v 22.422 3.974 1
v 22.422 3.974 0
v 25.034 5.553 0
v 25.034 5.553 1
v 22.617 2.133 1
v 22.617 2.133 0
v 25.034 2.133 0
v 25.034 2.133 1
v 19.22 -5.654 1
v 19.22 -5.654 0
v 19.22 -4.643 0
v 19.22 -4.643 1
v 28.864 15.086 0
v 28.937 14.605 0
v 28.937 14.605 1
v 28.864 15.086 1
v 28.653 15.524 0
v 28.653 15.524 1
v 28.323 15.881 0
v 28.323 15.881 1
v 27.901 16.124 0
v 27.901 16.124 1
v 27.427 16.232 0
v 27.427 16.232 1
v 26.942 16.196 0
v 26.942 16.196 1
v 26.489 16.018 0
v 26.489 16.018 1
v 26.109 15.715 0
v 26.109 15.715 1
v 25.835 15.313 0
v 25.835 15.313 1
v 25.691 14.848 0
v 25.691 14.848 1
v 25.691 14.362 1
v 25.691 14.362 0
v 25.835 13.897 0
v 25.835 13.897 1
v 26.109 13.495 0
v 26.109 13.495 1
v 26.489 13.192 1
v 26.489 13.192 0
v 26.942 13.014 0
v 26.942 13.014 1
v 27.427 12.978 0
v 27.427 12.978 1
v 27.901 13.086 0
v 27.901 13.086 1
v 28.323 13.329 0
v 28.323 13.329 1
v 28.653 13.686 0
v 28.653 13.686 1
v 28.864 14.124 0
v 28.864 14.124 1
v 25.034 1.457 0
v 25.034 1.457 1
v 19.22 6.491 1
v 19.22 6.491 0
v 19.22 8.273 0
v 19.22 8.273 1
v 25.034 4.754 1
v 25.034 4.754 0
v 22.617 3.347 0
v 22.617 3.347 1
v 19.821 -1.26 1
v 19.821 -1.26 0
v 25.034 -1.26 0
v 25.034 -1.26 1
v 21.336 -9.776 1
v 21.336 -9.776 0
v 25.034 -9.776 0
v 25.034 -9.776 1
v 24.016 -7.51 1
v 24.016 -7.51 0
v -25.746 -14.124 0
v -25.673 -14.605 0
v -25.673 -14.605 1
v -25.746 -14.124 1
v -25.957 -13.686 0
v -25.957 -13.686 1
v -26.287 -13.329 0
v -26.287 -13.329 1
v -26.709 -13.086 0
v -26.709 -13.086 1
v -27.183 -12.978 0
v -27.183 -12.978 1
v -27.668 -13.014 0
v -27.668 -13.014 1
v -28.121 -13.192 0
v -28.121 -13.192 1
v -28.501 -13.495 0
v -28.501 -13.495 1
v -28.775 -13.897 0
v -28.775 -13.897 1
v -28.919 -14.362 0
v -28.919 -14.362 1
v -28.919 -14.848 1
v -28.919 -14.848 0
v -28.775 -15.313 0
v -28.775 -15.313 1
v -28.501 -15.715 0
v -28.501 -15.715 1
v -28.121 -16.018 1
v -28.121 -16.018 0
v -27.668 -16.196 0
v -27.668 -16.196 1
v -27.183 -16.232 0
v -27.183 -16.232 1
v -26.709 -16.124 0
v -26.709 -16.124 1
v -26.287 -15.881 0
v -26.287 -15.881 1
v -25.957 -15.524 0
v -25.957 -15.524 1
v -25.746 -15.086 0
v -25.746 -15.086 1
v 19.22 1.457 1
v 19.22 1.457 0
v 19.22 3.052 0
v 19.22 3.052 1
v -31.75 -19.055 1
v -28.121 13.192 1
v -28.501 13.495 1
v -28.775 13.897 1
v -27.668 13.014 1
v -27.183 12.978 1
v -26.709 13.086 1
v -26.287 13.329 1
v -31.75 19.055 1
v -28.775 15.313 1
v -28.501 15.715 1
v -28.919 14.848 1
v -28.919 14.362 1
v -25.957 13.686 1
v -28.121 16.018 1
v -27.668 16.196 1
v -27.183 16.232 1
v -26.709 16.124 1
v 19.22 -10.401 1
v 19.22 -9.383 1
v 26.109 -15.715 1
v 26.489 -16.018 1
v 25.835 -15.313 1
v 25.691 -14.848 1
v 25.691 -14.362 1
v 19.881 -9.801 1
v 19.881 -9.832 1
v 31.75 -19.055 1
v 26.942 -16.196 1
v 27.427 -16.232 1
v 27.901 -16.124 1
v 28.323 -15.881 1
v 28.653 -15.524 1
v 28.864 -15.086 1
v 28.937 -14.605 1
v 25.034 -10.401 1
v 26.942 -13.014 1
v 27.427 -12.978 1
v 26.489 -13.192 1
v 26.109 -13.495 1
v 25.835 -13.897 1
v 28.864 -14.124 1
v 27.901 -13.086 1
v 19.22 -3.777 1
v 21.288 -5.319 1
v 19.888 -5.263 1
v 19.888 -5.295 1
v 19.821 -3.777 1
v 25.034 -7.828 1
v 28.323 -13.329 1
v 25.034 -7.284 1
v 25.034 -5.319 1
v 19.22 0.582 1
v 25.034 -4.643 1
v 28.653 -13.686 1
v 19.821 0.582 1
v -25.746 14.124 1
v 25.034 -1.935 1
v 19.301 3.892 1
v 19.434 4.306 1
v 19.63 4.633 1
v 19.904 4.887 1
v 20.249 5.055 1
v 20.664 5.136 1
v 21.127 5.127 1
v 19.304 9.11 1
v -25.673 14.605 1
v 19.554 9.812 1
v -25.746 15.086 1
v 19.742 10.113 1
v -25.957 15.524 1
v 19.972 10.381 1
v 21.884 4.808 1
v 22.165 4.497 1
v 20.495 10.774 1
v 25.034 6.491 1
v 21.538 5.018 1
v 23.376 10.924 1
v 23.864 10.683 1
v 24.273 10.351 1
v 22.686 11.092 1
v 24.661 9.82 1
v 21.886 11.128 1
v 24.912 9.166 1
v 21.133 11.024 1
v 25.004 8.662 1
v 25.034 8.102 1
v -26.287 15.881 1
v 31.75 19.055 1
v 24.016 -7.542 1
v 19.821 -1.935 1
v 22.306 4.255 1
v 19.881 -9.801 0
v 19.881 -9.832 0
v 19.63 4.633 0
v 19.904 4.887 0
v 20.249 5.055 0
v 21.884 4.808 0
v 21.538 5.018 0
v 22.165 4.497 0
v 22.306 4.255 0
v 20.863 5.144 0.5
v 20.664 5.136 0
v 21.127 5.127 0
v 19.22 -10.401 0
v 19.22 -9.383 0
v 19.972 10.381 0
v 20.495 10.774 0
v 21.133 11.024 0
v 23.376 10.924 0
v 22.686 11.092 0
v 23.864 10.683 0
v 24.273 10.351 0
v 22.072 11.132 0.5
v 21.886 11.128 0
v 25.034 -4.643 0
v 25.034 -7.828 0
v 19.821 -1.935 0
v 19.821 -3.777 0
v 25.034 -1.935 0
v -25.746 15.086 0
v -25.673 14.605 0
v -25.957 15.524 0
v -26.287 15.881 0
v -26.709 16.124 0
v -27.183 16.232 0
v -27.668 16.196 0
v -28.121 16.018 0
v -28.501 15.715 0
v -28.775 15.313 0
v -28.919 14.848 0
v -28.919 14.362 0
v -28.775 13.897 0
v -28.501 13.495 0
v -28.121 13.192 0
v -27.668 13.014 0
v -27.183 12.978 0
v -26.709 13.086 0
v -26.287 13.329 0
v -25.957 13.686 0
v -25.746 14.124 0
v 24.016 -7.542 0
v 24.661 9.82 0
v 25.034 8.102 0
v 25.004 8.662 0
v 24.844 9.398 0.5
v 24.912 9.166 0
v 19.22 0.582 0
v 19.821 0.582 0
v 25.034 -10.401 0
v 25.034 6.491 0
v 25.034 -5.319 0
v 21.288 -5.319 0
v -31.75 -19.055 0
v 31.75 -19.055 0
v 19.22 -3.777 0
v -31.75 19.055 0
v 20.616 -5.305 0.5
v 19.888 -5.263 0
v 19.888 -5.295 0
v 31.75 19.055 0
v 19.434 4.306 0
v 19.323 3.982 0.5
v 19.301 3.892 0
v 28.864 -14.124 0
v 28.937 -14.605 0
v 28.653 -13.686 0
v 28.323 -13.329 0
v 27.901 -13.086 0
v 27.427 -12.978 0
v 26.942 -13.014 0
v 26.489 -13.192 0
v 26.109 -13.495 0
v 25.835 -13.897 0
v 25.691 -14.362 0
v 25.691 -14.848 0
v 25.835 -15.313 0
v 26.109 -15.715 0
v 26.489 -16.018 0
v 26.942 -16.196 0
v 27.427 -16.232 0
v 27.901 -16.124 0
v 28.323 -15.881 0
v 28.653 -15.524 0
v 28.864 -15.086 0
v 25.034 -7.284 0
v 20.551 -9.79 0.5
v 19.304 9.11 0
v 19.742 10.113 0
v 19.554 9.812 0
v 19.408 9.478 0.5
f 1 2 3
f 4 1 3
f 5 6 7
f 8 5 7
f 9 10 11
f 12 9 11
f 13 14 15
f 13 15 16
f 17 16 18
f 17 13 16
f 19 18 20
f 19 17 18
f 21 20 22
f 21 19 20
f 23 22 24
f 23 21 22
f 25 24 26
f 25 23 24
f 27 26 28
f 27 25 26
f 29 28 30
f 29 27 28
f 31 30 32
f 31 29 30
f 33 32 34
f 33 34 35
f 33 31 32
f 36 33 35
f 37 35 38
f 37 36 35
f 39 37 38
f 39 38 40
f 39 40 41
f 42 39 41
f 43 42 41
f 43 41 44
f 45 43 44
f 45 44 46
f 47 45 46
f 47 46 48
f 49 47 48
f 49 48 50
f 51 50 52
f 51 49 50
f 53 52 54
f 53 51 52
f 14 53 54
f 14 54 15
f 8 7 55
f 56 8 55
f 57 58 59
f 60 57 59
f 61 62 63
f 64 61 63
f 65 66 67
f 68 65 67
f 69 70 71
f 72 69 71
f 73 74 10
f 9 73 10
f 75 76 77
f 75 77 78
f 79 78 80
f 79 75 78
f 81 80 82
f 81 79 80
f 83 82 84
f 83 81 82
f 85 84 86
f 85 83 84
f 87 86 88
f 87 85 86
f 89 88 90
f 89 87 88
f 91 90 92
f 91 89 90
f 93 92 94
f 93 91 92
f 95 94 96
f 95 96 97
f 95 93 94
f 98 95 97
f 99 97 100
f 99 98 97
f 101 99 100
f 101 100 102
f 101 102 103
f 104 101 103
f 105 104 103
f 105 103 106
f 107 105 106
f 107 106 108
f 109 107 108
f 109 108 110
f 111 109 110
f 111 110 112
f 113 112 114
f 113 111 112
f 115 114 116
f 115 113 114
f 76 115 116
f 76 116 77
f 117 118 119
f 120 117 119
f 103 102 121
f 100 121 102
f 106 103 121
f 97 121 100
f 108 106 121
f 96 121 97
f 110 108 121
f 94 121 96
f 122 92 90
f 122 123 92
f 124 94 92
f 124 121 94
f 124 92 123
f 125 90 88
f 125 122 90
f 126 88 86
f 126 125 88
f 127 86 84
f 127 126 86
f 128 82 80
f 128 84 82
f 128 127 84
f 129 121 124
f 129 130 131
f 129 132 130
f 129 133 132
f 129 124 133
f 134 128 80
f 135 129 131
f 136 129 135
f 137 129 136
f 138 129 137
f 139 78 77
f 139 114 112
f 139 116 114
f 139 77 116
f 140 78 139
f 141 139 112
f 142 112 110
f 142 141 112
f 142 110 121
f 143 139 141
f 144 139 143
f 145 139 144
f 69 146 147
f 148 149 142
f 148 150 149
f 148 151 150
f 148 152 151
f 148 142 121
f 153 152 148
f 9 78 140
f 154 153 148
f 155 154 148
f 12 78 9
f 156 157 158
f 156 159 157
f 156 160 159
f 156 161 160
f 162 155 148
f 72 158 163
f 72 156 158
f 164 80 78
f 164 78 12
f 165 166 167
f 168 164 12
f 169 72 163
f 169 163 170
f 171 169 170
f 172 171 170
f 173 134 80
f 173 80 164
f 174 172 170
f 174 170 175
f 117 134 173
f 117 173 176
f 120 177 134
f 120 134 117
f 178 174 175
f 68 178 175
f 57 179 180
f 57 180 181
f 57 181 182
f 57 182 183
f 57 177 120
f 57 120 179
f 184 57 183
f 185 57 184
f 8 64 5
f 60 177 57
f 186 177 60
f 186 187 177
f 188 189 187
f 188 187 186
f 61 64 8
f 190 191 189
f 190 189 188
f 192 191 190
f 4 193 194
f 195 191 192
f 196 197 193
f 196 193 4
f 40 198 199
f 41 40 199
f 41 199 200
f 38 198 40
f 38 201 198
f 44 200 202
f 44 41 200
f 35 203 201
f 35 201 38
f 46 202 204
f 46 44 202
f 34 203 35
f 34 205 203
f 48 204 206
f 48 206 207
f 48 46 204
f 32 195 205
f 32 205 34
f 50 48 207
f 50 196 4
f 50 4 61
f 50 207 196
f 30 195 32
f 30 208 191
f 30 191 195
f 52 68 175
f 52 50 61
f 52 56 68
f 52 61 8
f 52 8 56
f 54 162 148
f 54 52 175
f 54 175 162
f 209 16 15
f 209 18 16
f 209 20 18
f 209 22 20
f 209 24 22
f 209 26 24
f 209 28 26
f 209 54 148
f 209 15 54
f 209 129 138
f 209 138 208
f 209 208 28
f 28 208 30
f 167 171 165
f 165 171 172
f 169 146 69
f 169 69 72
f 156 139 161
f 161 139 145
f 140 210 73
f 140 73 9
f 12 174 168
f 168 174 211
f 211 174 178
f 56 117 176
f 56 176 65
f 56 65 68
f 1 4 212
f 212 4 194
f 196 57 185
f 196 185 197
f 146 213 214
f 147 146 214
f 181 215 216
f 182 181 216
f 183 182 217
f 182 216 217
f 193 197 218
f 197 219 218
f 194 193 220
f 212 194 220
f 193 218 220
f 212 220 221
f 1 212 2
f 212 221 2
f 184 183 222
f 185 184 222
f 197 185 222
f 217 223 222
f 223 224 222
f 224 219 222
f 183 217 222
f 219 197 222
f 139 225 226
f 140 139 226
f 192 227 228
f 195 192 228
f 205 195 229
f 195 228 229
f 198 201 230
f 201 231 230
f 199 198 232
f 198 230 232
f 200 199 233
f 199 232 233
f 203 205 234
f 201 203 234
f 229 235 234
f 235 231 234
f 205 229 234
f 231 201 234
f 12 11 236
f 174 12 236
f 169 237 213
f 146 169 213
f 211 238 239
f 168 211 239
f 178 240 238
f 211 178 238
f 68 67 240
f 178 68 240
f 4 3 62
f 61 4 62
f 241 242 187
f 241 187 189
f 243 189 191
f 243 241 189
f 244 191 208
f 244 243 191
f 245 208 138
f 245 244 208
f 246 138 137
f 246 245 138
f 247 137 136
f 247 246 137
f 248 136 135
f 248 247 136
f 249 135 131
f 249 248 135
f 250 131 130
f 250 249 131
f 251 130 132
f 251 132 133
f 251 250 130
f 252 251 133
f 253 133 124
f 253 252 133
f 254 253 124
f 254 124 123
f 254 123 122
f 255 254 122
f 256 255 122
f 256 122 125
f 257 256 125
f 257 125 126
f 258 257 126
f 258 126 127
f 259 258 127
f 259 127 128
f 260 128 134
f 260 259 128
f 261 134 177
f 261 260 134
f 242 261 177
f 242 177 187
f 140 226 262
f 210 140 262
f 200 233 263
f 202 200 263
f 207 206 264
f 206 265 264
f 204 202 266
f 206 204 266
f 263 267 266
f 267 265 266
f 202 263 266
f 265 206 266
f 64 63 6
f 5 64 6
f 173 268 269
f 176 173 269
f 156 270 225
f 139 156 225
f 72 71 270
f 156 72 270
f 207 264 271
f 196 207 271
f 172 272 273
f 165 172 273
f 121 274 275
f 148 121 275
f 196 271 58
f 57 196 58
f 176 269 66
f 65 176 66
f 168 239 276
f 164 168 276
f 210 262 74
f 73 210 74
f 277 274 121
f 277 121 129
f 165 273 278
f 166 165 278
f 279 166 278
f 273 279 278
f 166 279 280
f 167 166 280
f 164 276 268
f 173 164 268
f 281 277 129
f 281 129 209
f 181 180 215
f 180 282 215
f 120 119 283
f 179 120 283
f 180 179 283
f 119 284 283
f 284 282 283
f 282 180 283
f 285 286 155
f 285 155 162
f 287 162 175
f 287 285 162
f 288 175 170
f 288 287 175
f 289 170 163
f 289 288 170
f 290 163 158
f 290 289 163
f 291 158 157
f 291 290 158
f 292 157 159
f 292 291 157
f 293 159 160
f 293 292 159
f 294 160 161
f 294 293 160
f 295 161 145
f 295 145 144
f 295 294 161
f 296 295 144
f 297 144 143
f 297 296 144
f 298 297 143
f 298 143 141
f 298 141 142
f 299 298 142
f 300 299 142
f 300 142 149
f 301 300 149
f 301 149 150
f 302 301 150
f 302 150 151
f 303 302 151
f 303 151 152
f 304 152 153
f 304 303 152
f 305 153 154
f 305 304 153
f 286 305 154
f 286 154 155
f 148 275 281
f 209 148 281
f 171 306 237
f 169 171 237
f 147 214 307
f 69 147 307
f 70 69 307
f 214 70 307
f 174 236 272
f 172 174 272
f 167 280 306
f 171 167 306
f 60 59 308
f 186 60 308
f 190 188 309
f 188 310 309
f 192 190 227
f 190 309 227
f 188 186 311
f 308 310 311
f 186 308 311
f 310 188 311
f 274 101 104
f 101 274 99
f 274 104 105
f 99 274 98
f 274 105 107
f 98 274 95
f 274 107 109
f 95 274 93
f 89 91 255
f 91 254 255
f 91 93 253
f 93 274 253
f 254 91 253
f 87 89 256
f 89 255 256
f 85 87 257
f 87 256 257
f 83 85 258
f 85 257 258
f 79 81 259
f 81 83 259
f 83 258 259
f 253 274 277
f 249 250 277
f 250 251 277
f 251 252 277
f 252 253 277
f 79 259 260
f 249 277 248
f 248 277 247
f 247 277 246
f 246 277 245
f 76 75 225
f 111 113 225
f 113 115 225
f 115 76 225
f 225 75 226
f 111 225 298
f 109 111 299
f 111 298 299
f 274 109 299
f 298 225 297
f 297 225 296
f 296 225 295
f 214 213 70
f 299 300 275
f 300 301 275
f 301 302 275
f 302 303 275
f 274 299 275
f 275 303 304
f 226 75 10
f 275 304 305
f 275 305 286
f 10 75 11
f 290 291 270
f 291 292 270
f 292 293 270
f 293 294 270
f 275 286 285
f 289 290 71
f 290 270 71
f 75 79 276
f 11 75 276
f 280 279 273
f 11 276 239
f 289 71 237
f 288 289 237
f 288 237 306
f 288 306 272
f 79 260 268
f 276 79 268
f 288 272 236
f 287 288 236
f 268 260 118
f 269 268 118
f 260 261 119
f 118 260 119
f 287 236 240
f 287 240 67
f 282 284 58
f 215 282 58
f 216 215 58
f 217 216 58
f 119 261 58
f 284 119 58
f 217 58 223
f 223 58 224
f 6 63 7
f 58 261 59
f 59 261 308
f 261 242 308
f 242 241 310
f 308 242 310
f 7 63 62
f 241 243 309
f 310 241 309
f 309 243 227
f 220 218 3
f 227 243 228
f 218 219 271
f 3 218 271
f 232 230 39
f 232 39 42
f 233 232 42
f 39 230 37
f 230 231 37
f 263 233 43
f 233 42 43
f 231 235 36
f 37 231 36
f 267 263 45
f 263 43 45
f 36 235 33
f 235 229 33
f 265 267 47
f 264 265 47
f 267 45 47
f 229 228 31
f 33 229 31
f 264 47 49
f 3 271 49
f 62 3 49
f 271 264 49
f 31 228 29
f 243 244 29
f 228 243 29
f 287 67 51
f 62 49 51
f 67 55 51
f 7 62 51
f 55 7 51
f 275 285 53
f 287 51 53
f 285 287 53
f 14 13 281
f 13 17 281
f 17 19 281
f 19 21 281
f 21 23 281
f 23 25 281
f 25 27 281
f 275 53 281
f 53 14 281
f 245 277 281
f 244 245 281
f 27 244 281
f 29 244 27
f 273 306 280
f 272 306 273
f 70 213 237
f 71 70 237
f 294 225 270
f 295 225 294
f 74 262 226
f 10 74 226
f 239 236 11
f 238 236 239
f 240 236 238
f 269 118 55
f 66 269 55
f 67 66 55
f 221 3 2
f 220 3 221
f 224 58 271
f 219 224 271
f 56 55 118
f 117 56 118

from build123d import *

# Parameters (mm, degrees)
F0_W     = 63.5
F0_H     = 38.11
F0_R     = 1.63195
F1_DEPTH = 1


with BuildPart() as f1:
    # F0 (on Top) → F1 (new body)
    with BuildSketch(Plane.XY):
        Rectangle(F0_W, F0_H)
        with Locations((-27.305, -14.605)):
            Circle(F0_R, mode=Mode.SUBTRACT)
        with Locations((27.305, -14.605)):
            Circle(F0_R, mode=Mode.SUBTRACT)
        with BuildLine():
            Line((25.0343345106, -7.2836339695), (25.0343345106, -7.8282632467))
            Line((25.0343345106, -7.8282632467), (19.8807163504, -9.800635629))
            Line((19.8807163504, -9.800635629), (19.8807163504, -9.8324480867))
            add(Edge.make_bspline(
                [(19.8807163504, -9.8324480867), (20.4927880381, -9.776458161), (21.3364544184, -9.776458161)],
                knots=[0, 0, 0, 1, 1, 1], degree=2))
            Line((21.3364544184, -9.776458161), (25.0343345106, -9.776458161))
            Line((25.0343345106, -9.776458161), (25.0343345106, -10.4012548318))
            Line((25.0343345106, -10.4012548318), (19.220289727, -10.4012548318))
            Line((19.220289727, -10.4012548318), (19.220289727, -9.3832561829))
            Line((19.220289727, -9.3832561829), (24.0163358617, -7.5419511267))
            Line((24.0163358617, -7.5419511267), (24.0163358617, -7.5101386689))
            Line((24.0163358617, -7.5101386689), (19.220289727, -5.6535636329))
            Line((19.220289727, -5.6535636329), (19.220289727, -4.6431999739))
            Line((19.220289727, -4.6431999739), (25.0343345106, -4.6431999739))
            Line((25.0343345106, -4.6431999739), (25.0343345106, -5.3188965771))
            Line((25.0343345106, -5.3188965771), (21.2880994826, -5.3188965771))
            add(Edge.make_bspline(
                [(21.2880994826, -5.3188965771), (20.6442153371, -5.3188965771), (19.8883513403, -5.2629066514)],
                knots=[0, 0, 0, 1, 1, 1], degree=2))
            Line((19.8883513403, -5.2629066514), (19.8883513403, -5.2947191092))
            Line((19.8883513403, -5.2947191092), (25.0343345106, -7.2836339695))
        make_face(mode=Mode.SUBTRACT)
        Polygon((19.8209089298, -1.2596269646), (25.0343345106, -1.2596269646), (25.0343345106, -1.9353235678), (19.8209089298, -1.9353235678), (19.8209089298, -3.776628624), (19.220289727, -3.776628624), (19.220289727, 0.5816780917), (19.8209089298, 0.5816780917), align=None, mode=Mode.SUBTRACT)
        with Locations((-27.305, 14.605)):
            Circle(F0_R, mode=Mode.SUBTRACT)
        with BuildLine():
            Line((22.6165877194, 3.3468169218), (22.6165877194, 2.1328535329))
            Line((22.6165877194, 2.1328535329), (25.0343345106, 2.1328535329))
            Line((25.0343345106, 2.1328535329), (25.0343345106, 1.4571569297))
            Line((25.0343345106, 1.4571569297), (19.220289727, 1.4571569297))
            Line((19.220289727, 1.4571569297), (19.220289727, 3.0515973136))
            add(Edge.make_bspline(
                [(19.220289727, 3.0515973136), (19.220289727, 4.1217683933), (19.6300341831, 4.6326764652)],
                knots=[0, 0, 0, 1, 1, 1], degree=2))
            add(Edge.make_bspline(
                [(19.6300341831, 4.6326764652), (20.0397786393, 5.1435845371), (20.8630850466, 5.1435845371)],
                knots=[0, 0, 0, 1, 1, 1], degree=2))
            add(Edge.make_bspline(
                [(20.8630850466, 5.1435845371), (22.0159685165, 5.1435845371), (22.4218954778, 3.9741585892)],
                knots=[0, 0, 0, 1, 1, 1], degree=2))
            Line((22.4218954778, 3.9741585892), (25.0343345106, 5.5533289933))
            Line((25.0343345106, 5.5533289933), (25.0343345106, 4.7542000539))
            Line((25.0343345106, 4.7542000539), (22.6165877194, 3.3468169218))
        make_face(mode=Mode.SUBTRACT)
        with BuildLine():
            add(Edge.make_bspline(
                [(19.9716999797, 10.3805513366), (20.7231102324, 11.1319615894), (22.0719584422, 11.1319615894)],
                knots=[0, 0, 0, 1, 1, 1], degree=2))
            add(Edge.make_bspline(
                [(22.0719584422, 11.1319615894), (23.5111540321, 11.1319615894), (24.2727442713, 10.3506476263)],
                knots=[0, 0, 0, 1, 1, 1], degree=2))
            add(Edge.make_bspline(
                [(24.2727442713, 10.3506476263), (25.0343345106, 9.5693336633), (25.0343345106, 8.1021431105)],
                knots=[0, 0, 0, 1, 1, 1], degree=2))
            Line((25.0343345106, 8.1021431105), (25.0343345106, 6.4911602486))
            Line((25.0343345106, 6.4911602486), (19.220289727, 6.4911602486))
            Line((19.220289727, 6.4911602486), (19.220289727, 8.2726578842))
            add(Edge.make_bspline(
                [(19.220289727, 8.2726578842), (19.220289727, 9.6291410839), (19.9716999797, 10.3805513366)],
                knots=[0, 0, 0, 1, 1, 1], degree=2))
        make_face(mode=Mode.SUBTRACT)
        with Locations((27.305, 14.605)):
            Circle(F0_R, mode=Mode.SUBTRACT)
    extrude(amount=F1_DEPTH)


solid = f1.part
